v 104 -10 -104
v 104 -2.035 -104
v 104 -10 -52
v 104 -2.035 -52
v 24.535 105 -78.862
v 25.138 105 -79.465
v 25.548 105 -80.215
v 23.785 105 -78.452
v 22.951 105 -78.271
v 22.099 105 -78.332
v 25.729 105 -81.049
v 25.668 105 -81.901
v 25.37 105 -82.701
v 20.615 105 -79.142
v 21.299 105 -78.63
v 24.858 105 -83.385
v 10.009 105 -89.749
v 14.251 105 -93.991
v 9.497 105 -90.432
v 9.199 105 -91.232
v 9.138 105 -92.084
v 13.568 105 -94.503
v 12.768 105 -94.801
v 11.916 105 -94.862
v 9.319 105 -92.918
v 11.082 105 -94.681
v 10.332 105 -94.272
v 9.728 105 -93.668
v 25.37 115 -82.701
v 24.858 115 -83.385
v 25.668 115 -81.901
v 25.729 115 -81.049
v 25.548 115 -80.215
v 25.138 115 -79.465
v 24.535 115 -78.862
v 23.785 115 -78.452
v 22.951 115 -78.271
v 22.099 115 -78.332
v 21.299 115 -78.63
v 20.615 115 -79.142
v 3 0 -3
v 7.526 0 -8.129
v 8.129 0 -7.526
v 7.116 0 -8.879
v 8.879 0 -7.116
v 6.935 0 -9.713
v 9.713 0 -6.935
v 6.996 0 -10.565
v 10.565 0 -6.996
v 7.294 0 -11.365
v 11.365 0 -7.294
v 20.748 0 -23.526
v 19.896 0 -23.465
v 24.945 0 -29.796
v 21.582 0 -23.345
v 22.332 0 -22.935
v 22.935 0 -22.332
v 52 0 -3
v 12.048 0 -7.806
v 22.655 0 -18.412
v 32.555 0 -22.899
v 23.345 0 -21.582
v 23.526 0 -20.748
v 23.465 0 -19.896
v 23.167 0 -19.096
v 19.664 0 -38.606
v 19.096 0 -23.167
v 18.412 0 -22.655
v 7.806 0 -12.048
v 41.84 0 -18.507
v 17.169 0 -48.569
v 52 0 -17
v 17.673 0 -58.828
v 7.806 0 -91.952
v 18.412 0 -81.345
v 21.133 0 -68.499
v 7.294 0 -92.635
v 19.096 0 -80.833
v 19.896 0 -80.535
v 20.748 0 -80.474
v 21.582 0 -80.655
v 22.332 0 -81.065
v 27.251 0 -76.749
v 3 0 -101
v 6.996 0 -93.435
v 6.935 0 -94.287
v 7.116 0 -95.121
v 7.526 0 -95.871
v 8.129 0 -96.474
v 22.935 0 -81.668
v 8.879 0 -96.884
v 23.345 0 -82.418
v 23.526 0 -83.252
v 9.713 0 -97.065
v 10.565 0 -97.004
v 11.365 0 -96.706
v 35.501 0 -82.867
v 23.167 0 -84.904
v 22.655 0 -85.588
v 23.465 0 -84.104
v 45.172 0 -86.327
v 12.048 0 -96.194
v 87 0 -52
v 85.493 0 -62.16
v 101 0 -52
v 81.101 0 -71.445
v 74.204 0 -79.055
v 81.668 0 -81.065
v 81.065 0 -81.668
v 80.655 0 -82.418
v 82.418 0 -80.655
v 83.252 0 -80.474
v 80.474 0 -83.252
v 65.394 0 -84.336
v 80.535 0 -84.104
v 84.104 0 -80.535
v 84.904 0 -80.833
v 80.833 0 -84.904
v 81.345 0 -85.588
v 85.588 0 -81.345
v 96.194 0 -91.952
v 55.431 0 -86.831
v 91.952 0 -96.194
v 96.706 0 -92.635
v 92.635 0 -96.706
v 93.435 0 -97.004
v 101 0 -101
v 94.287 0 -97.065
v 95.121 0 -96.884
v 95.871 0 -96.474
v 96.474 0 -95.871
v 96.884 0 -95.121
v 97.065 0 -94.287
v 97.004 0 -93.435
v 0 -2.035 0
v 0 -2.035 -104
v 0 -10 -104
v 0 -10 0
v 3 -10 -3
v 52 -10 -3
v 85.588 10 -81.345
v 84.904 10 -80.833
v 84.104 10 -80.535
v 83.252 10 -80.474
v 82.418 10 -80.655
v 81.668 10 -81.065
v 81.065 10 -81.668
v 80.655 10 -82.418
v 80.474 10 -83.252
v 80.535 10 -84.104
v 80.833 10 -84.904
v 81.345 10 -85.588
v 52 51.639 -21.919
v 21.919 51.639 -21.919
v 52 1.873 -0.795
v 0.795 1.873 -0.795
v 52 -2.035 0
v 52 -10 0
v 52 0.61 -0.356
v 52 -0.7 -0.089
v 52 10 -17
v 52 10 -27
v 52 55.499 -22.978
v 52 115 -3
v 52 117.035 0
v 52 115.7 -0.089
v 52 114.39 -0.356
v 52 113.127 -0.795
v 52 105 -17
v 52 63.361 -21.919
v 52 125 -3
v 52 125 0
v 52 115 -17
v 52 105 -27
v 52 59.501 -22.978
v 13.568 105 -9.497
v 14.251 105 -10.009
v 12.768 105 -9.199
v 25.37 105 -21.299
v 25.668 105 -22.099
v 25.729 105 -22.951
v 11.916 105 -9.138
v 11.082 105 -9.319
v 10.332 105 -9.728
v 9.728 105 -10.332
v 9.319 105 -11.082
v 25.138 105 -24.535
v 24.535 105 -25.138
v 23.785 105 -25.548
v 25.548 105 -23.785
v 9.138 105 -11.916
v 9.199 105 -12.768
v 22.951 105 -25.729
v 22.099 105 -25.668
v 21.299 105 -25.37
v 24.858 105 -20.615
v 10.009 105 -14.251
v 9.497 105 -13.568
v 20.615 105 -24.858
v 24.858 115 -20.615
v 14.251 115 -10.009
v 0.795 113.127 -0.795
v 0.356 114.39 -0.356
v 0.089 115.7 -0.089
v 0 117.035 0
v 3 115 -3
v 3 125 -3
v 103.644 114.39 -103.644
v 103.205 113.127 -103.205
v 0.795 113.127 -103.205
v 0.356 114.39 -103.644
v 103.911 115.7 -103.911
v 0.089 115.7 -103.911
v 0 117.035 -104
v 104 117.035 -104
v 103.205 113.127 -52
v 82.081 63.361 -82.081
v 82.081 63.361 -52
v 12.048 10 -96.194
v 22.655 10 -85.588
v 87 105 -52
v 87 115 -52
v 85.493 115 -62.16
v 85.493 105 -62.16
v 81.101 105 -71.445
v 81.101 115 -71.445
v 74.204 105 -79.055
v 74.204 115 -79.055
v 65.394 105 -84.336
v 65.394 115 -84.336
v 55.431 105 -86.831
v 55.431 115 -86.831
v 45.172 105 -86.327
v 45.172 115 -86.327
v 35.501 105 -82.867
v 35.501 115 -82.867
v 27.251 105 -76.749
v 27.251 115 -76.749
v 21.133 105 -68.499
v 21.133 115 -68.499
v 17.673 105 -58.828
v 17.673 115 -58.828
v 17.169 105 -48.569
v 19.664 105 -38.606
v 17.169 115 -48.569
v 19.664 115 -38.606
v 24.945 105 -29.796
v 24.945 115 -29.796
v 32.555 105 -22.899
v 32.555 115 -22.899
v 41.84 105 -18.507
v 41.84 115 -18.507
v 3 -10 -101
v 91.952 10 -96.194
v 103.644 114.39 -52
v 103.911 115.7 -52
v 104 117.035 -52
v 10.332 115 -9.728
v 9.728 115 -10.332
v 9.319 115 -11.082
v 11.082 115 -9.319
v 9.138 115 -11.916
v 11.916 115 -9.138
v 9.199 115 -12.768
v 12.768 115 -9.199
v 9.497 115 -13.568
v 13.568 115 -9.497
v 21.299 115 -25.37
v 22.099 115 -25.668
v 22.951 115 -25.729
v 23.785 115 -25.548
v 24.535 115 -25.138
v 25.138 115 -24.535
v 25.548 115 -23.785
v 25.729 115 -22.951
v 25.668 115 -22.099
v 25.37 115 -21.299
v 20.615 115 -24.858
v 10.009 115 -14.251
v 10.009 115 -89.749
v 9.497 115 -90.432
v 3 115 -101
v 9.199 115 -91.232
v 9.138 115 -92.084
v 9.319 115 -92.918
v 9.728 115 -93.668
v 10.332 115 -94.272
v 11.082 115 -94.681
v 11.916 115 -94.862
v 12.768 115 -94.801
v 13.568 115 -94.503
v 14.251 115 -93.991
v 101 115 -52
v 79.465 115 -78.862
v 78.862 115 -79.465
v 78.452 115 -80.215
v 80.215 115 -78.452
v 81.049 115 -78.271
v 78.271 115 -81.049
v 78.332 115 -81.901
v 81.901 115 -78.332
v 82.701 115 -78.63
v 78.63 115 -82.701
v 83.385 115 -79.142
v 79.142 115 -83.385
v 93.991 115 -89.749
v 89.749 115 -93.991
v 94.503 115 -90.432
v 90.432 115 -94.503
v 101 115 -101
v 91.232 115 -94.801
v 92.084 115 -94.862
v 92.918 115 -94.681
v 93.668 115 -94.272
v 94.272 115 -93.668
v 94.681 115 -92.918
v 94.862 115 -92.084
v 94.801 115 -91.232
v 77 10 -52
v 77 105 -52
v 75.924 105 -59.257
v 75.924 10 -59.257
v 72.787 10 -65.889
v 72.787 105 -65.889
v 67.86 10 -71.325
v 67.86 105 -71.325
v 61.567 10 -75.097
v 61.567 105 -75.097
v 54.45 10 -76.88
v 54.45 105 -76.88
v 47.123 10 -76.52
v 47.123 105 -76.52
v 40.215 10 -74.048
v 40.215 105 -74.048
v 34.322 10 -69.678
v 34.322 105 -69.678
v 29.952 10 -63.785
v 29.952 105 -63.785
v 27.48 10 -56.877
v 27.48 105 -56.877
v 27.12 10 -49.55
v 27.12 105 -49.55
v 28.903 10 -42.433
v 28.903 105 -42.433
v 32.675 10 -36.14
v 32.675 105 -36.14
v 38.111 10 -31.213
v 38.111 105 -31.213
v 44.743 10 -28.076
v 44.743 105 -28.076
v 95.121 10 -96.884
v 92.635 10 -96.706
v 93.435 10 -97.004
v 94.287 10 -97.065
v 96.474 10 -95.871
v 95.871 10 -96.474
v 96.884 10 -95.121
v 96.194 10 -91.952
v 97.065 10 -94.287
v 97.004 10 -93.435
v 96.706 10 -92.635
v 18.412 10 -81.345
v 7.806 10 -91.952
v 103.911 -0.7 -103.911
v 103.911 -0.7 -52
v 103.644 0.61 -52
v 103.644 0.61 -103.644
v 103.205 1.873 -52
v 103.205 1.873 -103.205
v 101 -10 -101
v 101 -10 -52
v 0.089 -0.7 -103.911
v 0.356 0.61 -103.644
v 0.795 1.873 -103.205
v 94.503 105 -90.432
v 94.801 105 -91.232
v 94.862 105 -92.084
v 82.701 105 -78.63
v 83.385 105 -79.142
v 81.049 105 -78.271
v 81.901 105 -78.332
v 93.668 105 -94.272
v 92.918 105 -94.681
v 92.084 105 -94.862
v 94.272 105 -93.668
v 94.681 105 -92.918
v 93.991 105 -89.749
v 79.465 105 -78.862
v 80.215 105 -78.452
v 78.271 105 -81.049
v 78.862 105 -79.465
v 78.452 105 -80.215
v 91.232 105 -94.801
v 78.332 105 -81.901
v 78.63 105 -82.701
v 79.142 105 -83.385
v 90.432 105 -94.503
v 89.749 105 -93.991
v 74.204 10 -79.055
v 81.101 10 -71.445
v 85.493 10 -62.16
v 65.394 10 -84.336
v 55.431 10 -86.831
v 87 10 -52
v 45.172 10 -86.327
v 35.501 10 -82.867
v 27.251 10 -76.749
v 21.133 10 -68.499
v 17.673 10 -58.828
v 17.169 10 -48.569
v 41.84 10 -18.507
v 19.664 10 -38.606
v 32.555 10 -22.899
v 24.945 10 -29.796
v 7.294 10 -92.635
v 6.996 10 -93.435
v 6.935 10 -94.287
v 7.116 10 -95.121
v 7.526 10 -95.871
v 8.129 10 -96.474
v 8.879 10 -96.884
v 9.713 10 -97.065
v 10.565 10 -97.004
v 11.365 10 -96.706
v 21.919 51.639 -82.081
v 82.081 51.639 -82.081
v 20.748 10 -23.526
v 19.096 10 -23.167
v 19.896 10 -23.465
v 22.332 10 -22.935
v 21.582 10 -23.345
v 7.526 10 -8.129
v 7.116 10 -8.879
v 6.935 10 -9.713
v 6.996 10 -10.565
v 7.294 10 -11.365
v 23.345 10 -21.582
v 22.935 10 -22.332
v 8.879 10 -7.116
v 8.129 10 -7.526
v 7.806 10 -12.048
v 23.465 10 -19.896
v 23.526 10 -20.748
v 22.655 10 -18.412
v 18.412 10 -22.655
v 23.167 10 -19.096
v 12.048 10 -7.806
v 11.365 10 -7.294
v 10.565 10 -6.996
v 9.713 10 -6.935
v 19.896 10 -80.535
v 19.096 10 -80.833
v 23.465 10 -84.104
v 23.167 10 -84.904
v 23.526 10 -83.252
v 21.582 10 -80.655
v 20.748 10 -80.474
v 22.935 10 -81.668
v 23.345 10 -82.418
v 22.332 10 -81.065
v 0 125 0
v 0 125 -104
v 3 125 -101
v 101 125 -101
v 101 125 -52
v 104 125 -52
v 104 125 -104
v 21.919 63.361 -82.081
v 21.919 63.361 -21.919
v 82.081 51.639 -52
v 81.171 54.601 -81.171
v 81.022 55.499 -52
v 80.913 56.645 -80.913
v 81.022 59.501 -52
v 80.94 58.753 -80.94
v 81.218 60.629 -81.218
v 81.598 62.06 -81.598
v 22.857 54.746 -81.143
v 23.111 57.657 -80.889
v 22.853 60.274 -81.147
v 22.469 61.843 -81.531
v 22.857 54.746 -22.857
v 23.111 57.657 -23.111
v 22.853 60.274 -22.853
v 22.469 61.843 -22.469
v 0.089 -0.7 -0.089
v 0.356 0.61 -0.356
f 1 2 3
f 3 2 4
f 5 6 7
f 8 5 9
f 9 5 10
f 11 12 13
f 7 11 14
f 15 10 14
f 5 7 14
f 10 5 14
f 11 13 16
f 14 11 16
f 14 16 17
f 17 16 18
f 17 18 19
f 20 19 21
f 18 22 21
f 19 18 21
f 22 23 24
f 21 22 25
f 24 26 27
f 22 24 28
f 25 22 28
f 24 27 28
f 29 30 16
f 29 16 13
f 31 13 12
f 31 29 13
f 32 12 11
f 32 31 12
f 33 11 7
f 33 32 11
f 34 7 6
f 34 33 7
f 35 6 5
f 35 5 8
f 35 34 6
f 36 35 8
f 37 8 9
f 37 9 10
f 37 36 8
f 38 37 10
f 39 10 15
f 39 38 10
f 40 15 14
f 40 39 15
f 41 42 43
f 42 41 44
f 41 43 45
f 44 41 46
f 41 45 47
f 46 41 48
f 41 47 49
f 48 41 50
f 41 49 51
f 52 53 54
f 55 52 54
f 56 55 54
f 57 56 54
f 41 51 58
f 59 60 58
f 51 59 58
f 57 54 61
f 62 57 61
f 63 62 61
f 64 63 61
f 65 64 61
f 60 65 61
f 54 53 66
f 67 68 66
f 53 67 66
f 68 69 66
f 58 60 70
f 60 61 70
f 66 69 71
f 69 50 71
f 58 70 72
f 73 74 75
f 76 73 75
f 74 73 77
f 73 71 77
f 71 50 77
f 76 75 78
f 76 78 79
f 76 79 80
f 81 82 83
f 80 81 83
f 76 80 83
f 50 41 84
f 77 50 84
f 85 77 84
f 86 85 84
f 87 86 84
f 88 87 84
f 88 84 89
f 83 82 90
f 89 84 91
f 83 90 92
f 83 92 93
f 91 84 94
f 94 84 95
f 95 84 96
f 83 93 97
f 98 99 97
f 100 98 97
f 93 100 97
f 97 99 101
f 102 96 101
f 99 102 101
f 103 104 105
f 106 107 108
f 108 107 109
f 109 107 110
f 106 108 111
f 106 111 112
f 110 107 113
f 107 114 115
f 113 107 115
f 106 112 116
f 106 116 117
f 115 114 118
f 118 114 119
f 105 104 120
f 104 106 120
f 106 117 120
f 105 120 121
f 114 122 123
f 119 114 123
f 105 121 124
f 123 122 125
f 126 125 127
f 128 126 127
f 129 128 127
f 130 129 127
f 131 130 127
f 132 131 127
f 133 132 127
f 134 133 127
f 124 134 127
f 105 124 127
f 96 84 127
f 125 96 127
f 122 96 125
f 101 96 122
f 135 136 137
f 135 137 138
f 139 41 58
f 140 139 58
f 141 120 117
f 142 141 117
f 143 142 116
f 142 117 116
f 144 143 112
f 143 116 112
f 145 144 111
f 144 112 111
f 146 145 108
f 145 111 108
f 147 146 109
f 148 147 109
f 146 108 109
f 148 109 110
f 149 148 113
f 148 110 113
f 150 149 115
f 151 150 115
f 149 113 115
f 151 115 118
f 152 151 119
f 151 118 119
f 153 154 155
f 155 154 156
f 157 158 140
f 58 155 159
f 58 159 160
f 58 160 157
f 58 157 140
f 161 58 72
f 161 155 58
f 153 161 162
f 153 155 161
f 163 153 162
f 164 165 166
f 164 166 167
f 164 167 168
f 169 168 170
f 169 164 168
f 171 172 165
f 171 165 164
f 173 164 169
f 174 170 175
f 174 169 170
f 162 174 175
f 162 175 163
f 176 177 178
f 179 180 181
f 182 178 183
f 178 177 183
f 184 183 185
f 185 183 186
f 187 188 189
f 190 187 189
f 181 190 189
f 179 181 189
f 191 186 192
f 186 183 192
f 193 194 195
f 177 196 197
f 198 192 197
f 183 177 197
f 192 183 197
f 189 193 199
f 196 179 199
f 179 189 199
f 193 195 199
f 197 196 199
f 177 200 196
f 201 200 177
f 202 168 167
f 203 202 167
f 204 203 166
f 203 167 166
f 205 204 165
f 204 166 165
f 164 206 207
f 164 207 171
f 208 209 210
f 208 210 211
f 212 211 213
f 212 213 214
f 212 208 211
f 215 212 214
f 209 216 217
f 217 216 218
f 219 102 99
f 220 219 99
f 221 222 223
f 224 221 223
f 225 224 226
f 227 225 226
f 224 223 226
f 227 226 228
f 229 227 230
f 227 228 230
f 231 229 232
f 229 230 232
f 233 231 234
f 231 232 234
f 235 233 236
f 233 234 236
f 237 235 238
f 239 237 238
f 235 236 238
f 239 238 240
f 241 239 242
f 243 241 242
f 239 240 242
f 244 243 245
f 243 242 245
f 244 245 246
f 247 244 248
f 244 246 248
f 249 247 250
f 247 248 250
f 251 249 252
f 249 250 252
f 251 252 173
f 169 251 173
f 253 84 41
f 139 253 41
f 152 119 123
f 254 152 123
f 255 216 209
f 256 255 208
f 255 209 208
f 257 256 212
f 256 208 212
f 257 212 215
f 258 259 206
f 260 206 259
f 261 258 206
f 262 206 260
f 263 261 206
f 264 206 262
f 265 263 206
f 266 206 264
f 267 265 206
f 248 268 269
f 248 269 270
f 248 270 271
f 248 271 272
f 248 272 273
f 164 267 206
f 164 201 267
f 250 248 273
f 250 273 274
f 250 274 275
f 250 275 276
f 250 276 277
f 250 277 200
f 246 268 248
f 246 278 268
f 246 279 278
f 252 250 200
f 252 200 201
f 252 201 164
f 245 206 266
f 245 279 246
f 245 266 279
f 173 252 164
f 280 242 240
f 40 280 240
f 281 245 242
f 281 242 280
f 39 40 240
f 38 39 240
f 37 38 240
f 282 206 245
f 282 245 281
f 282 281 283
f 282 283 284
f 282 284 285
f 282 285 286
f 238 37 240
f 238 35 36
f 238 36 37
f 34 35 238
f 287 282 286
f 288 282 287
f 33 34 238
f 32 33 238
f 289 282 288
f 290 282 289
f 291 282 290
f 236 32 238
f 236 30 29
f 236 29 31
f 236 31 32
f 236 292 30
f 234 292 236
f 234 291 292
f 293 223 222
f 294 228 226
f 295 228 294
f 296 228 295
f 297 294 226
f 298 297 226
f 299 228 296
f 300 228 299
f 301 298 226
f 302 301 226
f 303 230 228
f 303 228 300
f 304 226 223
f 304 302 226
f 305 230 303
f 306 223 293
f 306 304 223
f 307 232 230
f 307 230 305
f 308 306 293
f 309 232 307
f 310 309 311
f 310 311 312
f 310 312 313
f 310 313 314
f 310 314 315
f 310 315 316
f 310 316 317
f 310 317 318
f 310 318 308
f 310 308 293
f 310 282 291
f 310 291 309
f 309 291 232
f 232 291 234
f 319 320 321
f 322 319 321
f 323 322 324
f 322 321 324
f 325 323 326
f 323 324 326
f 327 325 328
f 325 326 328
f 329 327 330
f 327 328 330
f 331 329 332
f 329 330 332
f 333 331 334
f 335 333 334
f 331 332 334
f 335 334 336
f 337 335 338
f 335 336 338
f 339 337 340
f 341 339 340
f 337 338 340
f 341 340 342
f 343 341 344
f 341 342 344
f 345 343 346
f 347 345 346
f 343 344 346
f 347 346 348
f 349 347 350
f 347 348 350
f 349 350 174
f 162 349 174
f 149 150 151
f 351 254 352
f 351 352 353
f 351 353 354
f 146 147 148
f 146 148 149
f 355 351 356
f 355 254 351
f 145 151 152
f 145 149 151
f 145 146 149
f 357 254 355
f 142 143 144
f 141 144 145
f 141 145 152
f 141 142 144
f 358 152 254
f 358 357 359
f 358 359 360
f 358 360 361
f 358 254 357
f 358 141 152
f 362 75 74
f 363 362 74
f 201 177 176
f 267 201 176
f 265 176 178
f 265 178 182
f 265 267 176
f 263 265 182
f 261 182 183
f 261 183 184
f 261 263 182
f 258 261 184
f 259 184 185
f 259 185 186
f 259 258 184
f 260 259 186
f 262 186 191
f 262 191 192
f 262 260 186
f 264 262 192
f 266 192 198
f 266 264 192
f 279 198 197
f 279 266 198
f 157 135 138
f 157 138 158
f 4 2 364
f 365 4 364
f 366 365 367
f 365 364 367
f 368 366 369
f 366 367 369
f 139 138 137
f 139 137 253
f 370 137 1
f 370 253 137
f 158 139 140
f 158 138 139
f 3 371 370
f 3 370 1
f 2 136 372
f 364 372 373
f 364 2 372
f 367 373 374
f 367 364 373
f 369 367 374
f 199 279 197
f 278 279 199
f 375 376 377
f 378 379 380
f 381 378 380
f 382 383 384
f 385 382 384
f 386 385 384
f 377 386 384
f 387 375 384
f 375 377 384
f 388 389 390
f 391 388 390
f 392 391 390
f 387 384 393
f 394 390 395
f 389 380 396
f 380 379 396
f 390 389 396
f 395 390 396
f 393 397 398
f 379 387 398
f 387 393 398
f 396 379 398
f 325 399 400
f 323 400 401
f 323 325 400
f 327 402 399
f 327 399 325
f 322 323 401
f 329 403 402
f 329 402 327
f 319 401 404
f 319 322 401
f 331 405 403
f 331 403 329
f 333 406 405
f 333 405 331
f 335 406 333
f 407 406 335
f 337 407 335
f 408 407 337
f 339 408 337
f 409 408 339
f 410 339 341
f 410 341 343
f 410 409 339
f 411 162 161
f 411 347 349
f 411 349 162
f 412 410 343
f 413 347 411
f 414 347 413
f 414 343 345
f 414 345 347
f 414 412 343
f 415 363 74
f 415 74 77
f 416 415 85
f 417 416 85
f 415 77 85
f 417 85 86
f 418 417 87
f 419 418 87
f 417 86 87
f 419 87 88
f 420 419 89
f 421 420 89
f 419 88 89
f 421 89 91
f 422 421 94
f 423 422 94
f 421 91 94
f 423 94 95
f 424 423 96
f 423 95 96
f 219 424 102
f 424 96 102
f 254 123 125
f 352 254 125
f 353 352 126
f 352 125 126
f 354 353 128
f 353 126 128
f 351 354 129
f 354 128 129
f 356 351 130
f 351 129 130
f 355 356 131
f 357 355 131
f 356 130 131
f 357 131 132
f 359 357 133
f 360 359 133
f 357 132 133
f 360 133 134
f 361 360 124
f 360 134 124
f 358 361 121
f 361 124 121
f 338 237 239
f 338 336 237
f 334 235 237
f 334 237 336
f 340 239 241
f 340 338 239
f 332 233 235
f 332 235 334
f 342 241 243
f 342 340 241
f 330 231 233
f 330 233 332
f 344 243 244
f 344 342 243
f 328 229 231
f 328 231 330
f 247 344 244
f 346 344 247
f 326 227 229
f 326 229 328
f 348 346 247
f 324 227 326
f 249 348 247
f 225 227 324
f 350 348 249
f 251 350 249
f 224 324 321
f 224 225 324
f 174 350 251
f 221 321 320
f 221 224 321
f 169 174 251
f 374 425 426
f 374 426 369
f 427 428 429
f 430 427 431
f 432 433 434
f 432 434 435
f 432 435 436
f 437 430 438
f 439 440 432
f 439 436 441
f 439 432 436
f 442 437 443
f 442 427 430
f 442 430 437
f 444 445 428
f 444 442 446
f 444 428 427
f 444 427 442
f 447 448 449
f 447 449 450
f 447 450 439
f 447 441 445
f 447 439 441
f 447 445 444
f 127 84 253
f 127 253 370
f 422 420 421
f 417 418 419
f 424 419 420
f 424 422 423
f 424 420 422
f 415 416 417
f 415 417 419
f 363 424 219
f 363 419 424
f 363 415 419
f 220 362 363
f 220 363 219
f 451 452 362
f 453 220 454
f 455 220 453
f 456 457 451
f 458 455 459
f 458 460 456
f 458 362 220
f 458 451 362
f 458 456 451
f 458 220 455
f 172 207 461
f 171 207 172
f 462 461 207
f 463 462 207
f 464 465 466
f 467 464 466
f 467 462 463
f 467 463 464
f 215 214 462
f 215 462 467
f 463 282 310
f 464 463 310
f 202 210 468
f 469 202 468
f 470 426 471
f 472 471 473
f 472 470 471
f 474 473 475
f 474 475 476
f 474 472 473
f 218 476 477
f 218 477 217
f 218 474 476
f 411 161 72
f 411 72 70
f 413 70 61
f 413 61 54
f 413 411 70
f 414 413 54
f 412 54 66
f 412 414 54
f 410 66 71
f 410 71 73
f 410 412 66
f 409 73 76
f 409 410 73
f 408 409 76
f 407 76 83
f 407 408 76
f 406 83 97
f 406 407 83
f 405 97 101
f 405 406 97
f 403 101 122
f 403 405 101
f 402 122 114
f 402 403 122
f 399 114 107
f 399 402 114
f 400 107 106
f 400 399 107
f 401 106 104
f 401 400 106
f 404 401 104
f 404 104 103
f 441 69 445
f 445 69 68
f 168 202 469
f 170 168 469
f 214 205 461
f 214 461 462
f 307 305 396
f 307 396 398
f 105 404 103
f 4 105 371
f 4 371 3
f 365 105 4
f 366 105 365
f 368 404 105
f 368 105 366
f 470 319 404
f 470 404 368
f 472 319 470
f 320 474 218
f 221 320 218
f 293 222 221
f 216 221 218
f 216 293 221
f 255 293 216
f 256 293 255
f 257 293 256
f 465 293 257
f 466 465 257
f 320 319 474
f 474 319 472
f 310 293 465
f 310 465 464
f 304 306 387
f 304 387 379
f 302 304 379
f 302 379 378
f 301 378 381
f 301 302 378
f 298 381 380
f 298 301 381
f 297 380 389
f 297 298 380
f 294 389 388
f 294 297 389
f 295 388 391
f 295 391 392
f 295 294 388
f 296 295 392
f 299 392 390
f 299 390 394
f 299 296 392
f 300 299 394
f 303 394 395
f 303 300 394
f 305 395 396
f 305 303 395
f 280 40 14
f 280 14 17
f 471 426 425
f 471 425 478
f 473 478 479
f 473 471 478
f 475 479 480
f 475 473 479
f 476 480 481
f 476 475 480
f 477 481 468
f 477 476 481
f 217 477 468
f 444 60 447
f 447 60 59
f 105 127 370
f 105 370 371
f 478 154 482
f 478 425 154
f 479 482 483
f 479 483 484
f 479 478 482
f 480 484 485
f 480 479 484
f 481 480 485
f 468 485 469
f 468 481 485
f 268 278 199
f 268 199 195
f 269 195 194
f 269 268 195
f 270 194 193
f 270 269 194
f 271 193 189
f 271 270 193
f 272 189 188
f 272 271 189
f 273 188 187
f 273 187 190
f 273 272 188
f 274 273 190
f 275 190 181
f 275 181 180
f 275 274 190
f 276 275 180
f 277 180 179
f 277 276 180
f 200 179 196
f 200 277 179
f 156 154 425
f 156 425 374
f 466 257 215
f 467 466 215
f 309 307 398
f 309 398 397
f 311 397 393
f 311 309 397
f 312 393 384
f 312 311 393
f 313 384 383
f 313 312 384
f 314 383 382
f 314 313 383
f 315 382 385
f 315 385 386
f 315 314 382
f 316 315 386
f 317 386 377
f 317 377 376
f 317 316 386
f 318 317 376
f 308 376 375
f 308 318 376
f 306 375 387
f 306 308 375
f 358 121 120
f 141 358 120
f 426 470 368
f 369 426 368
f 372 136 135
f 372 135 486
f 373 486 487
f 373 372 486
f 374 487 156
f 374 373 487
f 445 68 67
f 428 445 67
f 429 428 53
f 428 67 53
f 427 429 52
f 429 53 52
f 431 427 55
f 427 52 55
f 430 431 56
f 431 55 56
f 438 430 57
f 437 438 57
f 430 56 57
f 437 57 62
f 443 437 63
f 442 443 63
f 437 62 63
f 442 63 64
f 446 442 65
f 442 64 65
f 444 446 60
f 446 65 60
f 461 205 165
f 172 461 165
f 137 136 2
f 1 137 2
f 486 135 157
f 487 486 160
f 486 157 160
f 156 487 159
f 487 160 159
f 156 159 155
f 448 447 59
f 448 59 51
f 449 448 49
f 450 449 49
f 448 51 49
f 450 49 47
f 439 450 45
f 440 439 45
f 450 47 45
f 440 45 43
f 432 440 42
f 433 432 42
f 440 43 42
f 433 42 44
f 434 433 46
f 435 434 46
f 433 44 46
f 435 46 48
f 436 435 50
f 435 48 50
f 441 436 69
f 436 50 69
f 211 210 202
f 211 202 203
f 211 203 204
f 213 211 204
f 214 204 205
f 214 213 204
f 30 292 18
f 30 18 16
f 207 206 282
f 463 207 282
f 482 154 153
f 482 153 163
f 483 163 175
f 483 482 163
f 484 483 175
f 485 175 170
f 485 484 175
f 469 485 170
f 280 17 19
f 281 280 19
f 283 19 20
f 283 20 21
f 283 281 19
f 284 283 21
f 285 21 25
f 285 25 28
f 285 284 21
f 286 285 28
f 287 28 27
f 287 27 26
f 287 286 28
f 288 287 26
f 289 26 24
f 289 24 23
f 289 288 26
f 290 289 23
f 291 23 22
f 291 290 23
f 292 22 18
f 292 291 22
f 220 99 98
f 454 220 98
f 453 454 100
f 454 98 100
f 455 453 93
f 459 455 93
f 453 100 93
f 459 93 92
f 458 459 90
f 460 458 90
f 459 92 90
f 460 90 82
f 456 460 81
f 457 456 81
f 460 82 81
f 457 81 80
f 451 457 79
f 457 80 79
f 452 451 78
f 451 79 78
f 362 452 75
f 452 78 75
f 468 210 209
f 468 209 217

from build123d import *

# Parameters (mm, degrees)
SKETCH1_W           = 104
SKETCH1_H           = 104
BOSS_EXTRUDE1_DEPTH = 115
CUT_EXTRUDE1_DEPTH  = 187.70029459
SKETCH3_R           = 25
CUT_EXTRUDE2_DEPTH  = 187.70029459
CIRPATTERN1_COUNT   = 4
SKETCH4_R           = 35
CUT_EXTRUDE3_DEPTH  = 10
CUT_EXTRUDE4_START  = -10
SKETCH5_R           = 35
CUT_EXTRUDE4_DEPTH  = 10
FILLET2_R           = 15
SKETCH6_W           = 104
SKETCH6_H           = 104
SKETCH6_W_2         = 98
SKETCH6_H_2         = 98
BOSS_EXTRUDE2_DEPTH = 10
SKETCH7_W           = 104
SKETCH7_H           = 104
SKETCH7_W_2         = 98
SKETCH7_H_2         = 98
BOSS_EXTRUDE3_DEPTH = 10
CUT_EXTRUDE8_DEPTH  = 10
CUT_EXTRUDE9_DEPTH  = 10
FILLET3_R           = 10
SKETCH11_W          = 52
SKETCH11_H          = 52
CUT_EXTRUDE11_DEPTH = 200.642179912


with BuildPart() as part:
    # Sketch1 → Boss-Extrude1 (new body)
    with BuildSketch(Plane(origin=(0, 0, 0), x_dir=(1, 0, 0), z_dir=(0, 1, 0))):
        with Locations((52, 52)):
            Rectangle(SKETCH1_W, SKETCH1_H)
    extrude(amount=BOSS_EXTRUDE1_DEPTH)

    # Sketch2 → Cut-Extrude1 (cut, symmetric)
    with BuildSketch(Plane.XY):
        Polygon((229.074287939, 409.656557146), (104, 115), (79.592698068, 57.5), (104, 0), (229.074287939, -294.656557146), (869.280705191, -294.656557146), (869.280705191, 409.656557146), align=None)
    cut_extrude1 = extrude(amount=CUT_EXTRUDE1_DEPTH, both=True, mode=Mode.SUBTRACT)

    # Sketch3 → Cut-Extrude2 (cut, through all)
    with BuildSketch(Plane(origin=(0, 115, 0), x_dir=(1, 0, 0), z_dir=(0, 1, 0))):
        with Locations(Location((52, 52, 0), (0, 0, 270))):
            Circle(SKETCH3_R)
    cut_extrude2 = extrude(amount=-CUT_EXTRUDE2_DEPTH, mode=Mode.SUBTRACT)

    # CirPattern1: Cut-Extrude1, Cut-Extrude2 ×4 about axis
    cirpattern1_axis = Axis((52, 0, -52), (0, 1, 0))
    add([cut_extrude1.rotate(cirpattern1_axis, i * 360 / CIRPATTERN1_COUNT) for i in range(1, CIRPATTERN1_COUNT)], mode=Mode.SUBTRACT)
    add([cut_extrude2.rotate(cirpattern1_axis, i * 360 / CIRPATTERN1_COUNT) for i in range(1, CIRPATTERN1_COUNT)], mode=Mode.SUBTRACT)

    # Sketch4 → Cut-Extrude3 (cut)
    with BuildSketch(Plane(origin=(0, 115, 0), x_dir=(1, 0, 0), z_dir=(0, 1, 0))):
        with Locations(Location((52, 52, 0), (0, 0, 270))):
            Circle(SKETCH4_R)
    extrude(amount=-CUT_EXTRUDE3_DEPTH, mode=Mode.SUBTRACT)

    # Sketch5 → Cut-Extrude4 (cut)
    with BuildSketch(Plane.XZ.offset(CUT_EXTRUDE4_START)):
        with Locations(Location((52, -52, 0), (0, 0, 90))):
            Circle(SKETCH5_R)
    extrude(amount=CUT_EXTRUDE4_DEPTH, mode=Mode.SUBTRACT)

    # Fillet2
    fillet2_edges = [part.edges().sort_by_distance(p)[0] for p in [
        (79.592698068, 57.5, -52),
        (52, 57.5, -24.407301932),
        (24.407301932, 57.5, -52),
        (52, 57.5, -79.592698068),
    ]]
    fillet(fillet2_edges, radius=FILLET2_R)

    # Sketch6 → Boss-Extrude2 (add)
    with BuildSketch(Plane(origin=(0, 115, 0), x_dir=(1, 0, 0), z_dir=(0, 1, 0))):
        with Locations((52, 52)):
            Rectangle(SKETCH6_W, SKETCH6_H)
        with Locations((52, 52)):
            Rectangle(SKETCH6_W_2, SKETCH6_H_2, mode=Mode.SUBTRACT)
    extrude(amount=BOSS_EXTRUDE2_DEPTH)

    # Sketch7 → Boss-Extrude3 (add)
    with BuildSketch(Plane.XZ):
        with Locations((52, -52)):
            Rectangle(SKETCH7_W, SKETCH7_H)
        with Locations((52, -52)):
            Rectangle(SKETCH7_W_2, SKETCH7_H_2, mode=Mode.SUBTRACT)
    extrude(amount=BOSS_EXTRUDE3_DEPTH)

    # Sketch8 → Cut-Extrude8 (cut)
    with BuildSketch(Plane.XZ):
        with BuildLine():
            Line((85.587572106, -22.655068581), (96.194173824, -12.048466863))
            ThreePointArc((96.194173824, -12.048466863), (96.194173824, -7.805826176), (91.951533137, -7.805826176))
            Line((91.951533137, -7.805826176), (81.344931419, -18.412427894))
            ThreePointArc((81.344931419, -18.412427894), (81.344931419, -22.655068581), (85.587572106, -22.655068581))
        make_face()
        with BuildLine():
            Line((18.412427894, -81.344931419), (7.805826176, -91.951533137))
            ThreePointArc((7.805826176, -91.951533137), (7.805826176, -96.194173824), (12.048466863, -96.194173824))
            Line((12.048466863, -96.194173824), (22.655068581, -85.587572106))
            ThreePointArc((22.655068581, -85.587572106), (22.655068581, -81.344931419), (18.412427894, -81.344931419))
        make_face()
        with BuildLine():
            Line((22.655068581, -18.412427894), (12.048466863, -7.805826176))
            ThreePointArc((12.048466863, -7.805826176), (7.805826176, -7.805826176), (7.805826176, -12.048466863))
            Line((7.805826176, -12.048466863), (18.412427894, -22.655068581))
            ThreePointArc((18.412427894, -22.655068581), (22.655068581, -22.655068581), (22.655068581, -18.412427894))
        make_face()
        with BuildLine():
            Line((81.344931419, -85.587572106), (91.951533137, -96.194173824))
            ThreePointArc((91.951533137, -96.194173824), (96.194173824, -96.194173824), (96.194173824, -91.951533137))
            Line((96.194173824, -91.951533137), (85.587572106, -81.344931419))
            ThreePointArc((85.587572106, -81.344931419), (81.344931419, -81.344931419), (81.344931419, -85.587572106))
        make_face()
    extrude(amount=-CUT_EXTRUDE8_DEPTH, mode=Mode.SUBTRACT)

    # Sketch9 → Cut-Extrude9 (cut)
    with BuildSketch(Plane(origin=(0, 115, 0), x_dir=(1, 0, 0), z_dir=(0, 1, 0))):
        with BuildLine():
            Line((79.141990106, 83.384630793), (89.748591824, 93.991232511))
            ThreePointArc((89.748591824, 93.991232511), (93.991232511, 93.991232511), (93.991232511, 89.748591824))
            Line((93.991232511, 89.748591824), (83.384630793, 79.141990106))
            ThreePointArc((83.384630793, 79.141990106), (79.141990106, 79.141990106), (79.141990106, 83.384630793))
        make_face()
        with BuildLine():
            Line((83.384630793, 24.858009894), (93.991232511, 14.251408176))
            ThreePointArc((93.991232511, 14.251408176), (93.991232511, 10.008767489), (89.748591824, 10.008767489))
            Line((89.748591824, 10.008767489), (79.141990106, 20.615369207))
            ThreePointArc((79.141990106, 20.615369207), (79.141990106, 24.858009894), (83.384630793, 24.858009894))
        make_face()
        with BuildLine():
            Line((24.858009894, 20.615369207), (14.251408176, 10.008767489))
            ThreePointArc((14.251408176, 10.008767489), (10.008767489, 10.008767489), (10.008767489, 14.251408176))
            Line((10.008767489, 14.251408176), (20.615369207, 24.858009894))
            ThreePointArc((20.615369207, 24.858009894), (24.858009894, 24.858009894), (24.858009894, 20.615369207))
        make_face()
        with BuildLine():
            Line((20.615369207, 79.141990106), (10.008767489, 89.748591824))
            ThreePointArc((10.008767489, 89.748591824), (10.008767489, 93.991232511), (14.251408176, 93.991232511))
            Line((14.251408176, 93.991232511), (24.858009894, 83.384630793))
            ThreePointArc((24.858009894, 83.384630793), (24.858009894, 79.141990106), (20.615369207, 79.141990106))
        make_face()
    extrude(amount=-CUT_EXTRUDE9_DEPTH, mode=Mode.SUBTRACT)

    # Fillet3
    fillet3_edges = [part.edges().sort_by_distance(p)[0] for p in [
        (104, 115, -52),
        (52, 115, -104),
        (0, 115, -52),
        (52, 0, -104),
        (104, 0, -52),
        (52, 0, 0),
        (0, 0, -52),
        (52, 115, 0),
    ]]
    fillet(fillet3_edges, radius=FILLET3_R)

    # Sketch11 → Cut-Extrude11 (cut, through all)
    with BuildSketch(Plane(origin=(0, 125, 0), x_dir=(1, 0, 0), z_dir=(0, 1, 0))):
        with Locations((78, 26)):
            Rectangle(SKETCH11_W, SKETCH11_H)
    extrude(amount=-CUT_EXTRUDE11_DEPTH, mode=Mode.SUBTRACT)


solid = part.part
